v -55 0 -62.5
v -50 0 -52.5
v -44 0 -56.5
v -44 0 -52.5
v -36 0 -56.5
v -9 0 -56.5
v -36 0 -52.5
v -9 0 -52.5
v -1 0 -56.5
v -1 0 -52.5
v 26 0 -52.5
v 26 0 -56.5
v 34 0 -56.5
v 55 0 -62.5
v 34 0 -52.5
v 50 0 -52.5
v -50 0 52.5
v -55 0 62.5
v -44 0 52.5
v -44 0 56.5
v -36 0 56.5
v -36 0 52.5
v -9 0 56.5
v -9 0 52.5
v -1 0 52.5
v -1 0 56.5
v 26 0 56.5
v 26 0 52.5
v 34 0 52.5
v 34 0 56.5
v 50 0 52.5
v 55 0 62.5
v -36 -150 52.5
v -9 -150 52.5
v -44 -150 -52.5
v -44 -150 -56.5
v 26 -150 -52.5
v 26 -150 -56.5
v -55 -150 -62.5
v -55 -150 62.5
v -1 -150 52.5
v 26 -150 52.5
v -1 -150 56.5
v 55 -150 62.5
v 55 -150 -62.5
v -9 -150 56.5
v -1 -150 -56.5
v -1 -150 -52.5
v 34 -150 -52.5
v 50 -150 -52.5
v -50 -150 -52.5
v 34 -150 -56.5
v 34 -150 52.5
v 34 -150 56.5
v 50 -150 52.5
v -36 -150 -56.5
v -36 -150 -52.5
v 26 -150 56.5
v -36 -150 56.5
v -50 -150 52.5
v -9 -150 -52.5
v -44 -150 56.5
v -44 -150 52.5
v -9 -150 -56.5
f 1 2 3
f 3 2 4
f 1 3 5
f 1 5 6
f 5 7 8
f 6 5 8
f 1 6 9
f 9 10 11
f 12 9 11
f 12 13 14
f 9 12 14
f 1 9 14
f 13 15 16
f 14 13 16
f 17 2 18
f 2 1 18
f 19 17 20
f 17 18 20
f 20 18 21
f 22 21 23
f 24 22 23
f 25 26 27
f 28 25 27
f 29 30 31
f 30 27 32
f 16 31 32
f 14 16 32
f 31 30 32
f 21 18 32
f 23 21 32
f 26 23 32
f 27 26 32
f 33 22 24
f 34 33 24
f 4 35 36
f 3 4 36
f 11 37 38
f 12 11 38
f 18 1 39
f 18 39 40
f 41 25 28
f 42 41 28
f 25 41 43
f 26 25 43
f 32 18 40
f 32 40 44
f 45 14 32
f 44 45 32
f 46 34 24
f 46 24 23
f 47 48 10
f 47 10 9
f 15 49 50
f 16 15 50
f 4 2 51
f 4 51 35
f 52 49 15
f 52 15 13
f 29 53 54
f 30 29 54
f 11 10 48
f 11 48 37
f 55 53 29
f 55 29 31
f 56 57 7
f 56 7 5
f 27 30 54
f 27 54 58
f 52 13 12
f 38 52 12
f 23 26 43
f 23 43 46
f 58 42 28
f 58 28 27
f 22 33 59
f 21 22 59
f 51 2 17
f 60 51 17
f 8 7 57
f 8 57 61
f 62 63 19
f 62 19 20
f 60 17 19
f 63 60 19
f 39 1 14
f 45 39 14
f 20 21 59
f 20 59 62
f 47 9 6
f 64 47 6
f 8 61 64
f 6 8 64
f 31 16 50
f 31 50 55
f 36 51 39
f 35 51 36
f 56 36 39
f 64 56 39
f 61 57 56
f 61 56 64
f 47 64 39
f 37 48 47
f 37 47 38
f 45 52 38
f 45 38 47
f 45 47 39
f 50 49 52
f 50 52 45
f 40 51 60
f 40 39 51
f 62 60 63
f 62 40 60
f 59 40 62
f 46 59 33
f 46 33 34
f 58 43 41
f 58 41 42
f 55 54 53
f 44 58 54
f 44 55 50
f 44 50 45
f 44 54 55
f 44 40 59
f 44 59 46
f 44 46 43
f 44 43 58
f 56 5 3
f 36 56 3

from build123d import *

# Parameters (mm, degrees)
F0_W     = 110
F0_H     = 125
F0_W_2   = 100
F0_H_2   = 105
F1_DEPTH = 150
F2_W     = 4
F2_H     = 4
F3_DEPTH = 150


# Not quite as in the source:
# - a pattern or mirror of a feature is missing from the dataset's text; its kind, count and spacing are read off the source's solid


with BuildPart() as f1:
    # F0 (on Front) → F1 (new body)
    with BuildSketch(Plane.XZ):
        Rectangle(F0_W, F0_H)
        Rectangle(F0_W_2, F0_H_2, mode=Mode.SUBTRACT)
    extrude(amount=F1_DEPTH)

    # F2 (on face) → F3 (cut, through all)
    with BuildSketch(Plane.XZ.offset(150)):
        with Locations((-42, 54.5)):
            Rectangle(F2_W, F2_H)
        with Locations((-38, 54.5)):
            Rectangle(F2_W, F2_H)
        with Locations((-3, 54.5)):
            Rectangle(F2_W, F2_H)
        with Locations((-7, 54.5)):
            Rectangle(F2_W, F2_H)
        with Locations((32, 54.5)):
            Rectangle(F2_W, F2_H)
        with Locations((28, 54.5)):
            Rectangle(F2_W, F2_H)
    f3 = extrude(amount=-F3_DEPTH, mode=Mode.SUBTRACT)

    # F3_copies: F3 across plane
    add(f3.mirror(Plane(origin=(0, 0, 0), x_dir=(-1, 0, 0), z_dir=(0, 0, -1))), mode=Mode.SUBTRACT)


solid = f1.part
